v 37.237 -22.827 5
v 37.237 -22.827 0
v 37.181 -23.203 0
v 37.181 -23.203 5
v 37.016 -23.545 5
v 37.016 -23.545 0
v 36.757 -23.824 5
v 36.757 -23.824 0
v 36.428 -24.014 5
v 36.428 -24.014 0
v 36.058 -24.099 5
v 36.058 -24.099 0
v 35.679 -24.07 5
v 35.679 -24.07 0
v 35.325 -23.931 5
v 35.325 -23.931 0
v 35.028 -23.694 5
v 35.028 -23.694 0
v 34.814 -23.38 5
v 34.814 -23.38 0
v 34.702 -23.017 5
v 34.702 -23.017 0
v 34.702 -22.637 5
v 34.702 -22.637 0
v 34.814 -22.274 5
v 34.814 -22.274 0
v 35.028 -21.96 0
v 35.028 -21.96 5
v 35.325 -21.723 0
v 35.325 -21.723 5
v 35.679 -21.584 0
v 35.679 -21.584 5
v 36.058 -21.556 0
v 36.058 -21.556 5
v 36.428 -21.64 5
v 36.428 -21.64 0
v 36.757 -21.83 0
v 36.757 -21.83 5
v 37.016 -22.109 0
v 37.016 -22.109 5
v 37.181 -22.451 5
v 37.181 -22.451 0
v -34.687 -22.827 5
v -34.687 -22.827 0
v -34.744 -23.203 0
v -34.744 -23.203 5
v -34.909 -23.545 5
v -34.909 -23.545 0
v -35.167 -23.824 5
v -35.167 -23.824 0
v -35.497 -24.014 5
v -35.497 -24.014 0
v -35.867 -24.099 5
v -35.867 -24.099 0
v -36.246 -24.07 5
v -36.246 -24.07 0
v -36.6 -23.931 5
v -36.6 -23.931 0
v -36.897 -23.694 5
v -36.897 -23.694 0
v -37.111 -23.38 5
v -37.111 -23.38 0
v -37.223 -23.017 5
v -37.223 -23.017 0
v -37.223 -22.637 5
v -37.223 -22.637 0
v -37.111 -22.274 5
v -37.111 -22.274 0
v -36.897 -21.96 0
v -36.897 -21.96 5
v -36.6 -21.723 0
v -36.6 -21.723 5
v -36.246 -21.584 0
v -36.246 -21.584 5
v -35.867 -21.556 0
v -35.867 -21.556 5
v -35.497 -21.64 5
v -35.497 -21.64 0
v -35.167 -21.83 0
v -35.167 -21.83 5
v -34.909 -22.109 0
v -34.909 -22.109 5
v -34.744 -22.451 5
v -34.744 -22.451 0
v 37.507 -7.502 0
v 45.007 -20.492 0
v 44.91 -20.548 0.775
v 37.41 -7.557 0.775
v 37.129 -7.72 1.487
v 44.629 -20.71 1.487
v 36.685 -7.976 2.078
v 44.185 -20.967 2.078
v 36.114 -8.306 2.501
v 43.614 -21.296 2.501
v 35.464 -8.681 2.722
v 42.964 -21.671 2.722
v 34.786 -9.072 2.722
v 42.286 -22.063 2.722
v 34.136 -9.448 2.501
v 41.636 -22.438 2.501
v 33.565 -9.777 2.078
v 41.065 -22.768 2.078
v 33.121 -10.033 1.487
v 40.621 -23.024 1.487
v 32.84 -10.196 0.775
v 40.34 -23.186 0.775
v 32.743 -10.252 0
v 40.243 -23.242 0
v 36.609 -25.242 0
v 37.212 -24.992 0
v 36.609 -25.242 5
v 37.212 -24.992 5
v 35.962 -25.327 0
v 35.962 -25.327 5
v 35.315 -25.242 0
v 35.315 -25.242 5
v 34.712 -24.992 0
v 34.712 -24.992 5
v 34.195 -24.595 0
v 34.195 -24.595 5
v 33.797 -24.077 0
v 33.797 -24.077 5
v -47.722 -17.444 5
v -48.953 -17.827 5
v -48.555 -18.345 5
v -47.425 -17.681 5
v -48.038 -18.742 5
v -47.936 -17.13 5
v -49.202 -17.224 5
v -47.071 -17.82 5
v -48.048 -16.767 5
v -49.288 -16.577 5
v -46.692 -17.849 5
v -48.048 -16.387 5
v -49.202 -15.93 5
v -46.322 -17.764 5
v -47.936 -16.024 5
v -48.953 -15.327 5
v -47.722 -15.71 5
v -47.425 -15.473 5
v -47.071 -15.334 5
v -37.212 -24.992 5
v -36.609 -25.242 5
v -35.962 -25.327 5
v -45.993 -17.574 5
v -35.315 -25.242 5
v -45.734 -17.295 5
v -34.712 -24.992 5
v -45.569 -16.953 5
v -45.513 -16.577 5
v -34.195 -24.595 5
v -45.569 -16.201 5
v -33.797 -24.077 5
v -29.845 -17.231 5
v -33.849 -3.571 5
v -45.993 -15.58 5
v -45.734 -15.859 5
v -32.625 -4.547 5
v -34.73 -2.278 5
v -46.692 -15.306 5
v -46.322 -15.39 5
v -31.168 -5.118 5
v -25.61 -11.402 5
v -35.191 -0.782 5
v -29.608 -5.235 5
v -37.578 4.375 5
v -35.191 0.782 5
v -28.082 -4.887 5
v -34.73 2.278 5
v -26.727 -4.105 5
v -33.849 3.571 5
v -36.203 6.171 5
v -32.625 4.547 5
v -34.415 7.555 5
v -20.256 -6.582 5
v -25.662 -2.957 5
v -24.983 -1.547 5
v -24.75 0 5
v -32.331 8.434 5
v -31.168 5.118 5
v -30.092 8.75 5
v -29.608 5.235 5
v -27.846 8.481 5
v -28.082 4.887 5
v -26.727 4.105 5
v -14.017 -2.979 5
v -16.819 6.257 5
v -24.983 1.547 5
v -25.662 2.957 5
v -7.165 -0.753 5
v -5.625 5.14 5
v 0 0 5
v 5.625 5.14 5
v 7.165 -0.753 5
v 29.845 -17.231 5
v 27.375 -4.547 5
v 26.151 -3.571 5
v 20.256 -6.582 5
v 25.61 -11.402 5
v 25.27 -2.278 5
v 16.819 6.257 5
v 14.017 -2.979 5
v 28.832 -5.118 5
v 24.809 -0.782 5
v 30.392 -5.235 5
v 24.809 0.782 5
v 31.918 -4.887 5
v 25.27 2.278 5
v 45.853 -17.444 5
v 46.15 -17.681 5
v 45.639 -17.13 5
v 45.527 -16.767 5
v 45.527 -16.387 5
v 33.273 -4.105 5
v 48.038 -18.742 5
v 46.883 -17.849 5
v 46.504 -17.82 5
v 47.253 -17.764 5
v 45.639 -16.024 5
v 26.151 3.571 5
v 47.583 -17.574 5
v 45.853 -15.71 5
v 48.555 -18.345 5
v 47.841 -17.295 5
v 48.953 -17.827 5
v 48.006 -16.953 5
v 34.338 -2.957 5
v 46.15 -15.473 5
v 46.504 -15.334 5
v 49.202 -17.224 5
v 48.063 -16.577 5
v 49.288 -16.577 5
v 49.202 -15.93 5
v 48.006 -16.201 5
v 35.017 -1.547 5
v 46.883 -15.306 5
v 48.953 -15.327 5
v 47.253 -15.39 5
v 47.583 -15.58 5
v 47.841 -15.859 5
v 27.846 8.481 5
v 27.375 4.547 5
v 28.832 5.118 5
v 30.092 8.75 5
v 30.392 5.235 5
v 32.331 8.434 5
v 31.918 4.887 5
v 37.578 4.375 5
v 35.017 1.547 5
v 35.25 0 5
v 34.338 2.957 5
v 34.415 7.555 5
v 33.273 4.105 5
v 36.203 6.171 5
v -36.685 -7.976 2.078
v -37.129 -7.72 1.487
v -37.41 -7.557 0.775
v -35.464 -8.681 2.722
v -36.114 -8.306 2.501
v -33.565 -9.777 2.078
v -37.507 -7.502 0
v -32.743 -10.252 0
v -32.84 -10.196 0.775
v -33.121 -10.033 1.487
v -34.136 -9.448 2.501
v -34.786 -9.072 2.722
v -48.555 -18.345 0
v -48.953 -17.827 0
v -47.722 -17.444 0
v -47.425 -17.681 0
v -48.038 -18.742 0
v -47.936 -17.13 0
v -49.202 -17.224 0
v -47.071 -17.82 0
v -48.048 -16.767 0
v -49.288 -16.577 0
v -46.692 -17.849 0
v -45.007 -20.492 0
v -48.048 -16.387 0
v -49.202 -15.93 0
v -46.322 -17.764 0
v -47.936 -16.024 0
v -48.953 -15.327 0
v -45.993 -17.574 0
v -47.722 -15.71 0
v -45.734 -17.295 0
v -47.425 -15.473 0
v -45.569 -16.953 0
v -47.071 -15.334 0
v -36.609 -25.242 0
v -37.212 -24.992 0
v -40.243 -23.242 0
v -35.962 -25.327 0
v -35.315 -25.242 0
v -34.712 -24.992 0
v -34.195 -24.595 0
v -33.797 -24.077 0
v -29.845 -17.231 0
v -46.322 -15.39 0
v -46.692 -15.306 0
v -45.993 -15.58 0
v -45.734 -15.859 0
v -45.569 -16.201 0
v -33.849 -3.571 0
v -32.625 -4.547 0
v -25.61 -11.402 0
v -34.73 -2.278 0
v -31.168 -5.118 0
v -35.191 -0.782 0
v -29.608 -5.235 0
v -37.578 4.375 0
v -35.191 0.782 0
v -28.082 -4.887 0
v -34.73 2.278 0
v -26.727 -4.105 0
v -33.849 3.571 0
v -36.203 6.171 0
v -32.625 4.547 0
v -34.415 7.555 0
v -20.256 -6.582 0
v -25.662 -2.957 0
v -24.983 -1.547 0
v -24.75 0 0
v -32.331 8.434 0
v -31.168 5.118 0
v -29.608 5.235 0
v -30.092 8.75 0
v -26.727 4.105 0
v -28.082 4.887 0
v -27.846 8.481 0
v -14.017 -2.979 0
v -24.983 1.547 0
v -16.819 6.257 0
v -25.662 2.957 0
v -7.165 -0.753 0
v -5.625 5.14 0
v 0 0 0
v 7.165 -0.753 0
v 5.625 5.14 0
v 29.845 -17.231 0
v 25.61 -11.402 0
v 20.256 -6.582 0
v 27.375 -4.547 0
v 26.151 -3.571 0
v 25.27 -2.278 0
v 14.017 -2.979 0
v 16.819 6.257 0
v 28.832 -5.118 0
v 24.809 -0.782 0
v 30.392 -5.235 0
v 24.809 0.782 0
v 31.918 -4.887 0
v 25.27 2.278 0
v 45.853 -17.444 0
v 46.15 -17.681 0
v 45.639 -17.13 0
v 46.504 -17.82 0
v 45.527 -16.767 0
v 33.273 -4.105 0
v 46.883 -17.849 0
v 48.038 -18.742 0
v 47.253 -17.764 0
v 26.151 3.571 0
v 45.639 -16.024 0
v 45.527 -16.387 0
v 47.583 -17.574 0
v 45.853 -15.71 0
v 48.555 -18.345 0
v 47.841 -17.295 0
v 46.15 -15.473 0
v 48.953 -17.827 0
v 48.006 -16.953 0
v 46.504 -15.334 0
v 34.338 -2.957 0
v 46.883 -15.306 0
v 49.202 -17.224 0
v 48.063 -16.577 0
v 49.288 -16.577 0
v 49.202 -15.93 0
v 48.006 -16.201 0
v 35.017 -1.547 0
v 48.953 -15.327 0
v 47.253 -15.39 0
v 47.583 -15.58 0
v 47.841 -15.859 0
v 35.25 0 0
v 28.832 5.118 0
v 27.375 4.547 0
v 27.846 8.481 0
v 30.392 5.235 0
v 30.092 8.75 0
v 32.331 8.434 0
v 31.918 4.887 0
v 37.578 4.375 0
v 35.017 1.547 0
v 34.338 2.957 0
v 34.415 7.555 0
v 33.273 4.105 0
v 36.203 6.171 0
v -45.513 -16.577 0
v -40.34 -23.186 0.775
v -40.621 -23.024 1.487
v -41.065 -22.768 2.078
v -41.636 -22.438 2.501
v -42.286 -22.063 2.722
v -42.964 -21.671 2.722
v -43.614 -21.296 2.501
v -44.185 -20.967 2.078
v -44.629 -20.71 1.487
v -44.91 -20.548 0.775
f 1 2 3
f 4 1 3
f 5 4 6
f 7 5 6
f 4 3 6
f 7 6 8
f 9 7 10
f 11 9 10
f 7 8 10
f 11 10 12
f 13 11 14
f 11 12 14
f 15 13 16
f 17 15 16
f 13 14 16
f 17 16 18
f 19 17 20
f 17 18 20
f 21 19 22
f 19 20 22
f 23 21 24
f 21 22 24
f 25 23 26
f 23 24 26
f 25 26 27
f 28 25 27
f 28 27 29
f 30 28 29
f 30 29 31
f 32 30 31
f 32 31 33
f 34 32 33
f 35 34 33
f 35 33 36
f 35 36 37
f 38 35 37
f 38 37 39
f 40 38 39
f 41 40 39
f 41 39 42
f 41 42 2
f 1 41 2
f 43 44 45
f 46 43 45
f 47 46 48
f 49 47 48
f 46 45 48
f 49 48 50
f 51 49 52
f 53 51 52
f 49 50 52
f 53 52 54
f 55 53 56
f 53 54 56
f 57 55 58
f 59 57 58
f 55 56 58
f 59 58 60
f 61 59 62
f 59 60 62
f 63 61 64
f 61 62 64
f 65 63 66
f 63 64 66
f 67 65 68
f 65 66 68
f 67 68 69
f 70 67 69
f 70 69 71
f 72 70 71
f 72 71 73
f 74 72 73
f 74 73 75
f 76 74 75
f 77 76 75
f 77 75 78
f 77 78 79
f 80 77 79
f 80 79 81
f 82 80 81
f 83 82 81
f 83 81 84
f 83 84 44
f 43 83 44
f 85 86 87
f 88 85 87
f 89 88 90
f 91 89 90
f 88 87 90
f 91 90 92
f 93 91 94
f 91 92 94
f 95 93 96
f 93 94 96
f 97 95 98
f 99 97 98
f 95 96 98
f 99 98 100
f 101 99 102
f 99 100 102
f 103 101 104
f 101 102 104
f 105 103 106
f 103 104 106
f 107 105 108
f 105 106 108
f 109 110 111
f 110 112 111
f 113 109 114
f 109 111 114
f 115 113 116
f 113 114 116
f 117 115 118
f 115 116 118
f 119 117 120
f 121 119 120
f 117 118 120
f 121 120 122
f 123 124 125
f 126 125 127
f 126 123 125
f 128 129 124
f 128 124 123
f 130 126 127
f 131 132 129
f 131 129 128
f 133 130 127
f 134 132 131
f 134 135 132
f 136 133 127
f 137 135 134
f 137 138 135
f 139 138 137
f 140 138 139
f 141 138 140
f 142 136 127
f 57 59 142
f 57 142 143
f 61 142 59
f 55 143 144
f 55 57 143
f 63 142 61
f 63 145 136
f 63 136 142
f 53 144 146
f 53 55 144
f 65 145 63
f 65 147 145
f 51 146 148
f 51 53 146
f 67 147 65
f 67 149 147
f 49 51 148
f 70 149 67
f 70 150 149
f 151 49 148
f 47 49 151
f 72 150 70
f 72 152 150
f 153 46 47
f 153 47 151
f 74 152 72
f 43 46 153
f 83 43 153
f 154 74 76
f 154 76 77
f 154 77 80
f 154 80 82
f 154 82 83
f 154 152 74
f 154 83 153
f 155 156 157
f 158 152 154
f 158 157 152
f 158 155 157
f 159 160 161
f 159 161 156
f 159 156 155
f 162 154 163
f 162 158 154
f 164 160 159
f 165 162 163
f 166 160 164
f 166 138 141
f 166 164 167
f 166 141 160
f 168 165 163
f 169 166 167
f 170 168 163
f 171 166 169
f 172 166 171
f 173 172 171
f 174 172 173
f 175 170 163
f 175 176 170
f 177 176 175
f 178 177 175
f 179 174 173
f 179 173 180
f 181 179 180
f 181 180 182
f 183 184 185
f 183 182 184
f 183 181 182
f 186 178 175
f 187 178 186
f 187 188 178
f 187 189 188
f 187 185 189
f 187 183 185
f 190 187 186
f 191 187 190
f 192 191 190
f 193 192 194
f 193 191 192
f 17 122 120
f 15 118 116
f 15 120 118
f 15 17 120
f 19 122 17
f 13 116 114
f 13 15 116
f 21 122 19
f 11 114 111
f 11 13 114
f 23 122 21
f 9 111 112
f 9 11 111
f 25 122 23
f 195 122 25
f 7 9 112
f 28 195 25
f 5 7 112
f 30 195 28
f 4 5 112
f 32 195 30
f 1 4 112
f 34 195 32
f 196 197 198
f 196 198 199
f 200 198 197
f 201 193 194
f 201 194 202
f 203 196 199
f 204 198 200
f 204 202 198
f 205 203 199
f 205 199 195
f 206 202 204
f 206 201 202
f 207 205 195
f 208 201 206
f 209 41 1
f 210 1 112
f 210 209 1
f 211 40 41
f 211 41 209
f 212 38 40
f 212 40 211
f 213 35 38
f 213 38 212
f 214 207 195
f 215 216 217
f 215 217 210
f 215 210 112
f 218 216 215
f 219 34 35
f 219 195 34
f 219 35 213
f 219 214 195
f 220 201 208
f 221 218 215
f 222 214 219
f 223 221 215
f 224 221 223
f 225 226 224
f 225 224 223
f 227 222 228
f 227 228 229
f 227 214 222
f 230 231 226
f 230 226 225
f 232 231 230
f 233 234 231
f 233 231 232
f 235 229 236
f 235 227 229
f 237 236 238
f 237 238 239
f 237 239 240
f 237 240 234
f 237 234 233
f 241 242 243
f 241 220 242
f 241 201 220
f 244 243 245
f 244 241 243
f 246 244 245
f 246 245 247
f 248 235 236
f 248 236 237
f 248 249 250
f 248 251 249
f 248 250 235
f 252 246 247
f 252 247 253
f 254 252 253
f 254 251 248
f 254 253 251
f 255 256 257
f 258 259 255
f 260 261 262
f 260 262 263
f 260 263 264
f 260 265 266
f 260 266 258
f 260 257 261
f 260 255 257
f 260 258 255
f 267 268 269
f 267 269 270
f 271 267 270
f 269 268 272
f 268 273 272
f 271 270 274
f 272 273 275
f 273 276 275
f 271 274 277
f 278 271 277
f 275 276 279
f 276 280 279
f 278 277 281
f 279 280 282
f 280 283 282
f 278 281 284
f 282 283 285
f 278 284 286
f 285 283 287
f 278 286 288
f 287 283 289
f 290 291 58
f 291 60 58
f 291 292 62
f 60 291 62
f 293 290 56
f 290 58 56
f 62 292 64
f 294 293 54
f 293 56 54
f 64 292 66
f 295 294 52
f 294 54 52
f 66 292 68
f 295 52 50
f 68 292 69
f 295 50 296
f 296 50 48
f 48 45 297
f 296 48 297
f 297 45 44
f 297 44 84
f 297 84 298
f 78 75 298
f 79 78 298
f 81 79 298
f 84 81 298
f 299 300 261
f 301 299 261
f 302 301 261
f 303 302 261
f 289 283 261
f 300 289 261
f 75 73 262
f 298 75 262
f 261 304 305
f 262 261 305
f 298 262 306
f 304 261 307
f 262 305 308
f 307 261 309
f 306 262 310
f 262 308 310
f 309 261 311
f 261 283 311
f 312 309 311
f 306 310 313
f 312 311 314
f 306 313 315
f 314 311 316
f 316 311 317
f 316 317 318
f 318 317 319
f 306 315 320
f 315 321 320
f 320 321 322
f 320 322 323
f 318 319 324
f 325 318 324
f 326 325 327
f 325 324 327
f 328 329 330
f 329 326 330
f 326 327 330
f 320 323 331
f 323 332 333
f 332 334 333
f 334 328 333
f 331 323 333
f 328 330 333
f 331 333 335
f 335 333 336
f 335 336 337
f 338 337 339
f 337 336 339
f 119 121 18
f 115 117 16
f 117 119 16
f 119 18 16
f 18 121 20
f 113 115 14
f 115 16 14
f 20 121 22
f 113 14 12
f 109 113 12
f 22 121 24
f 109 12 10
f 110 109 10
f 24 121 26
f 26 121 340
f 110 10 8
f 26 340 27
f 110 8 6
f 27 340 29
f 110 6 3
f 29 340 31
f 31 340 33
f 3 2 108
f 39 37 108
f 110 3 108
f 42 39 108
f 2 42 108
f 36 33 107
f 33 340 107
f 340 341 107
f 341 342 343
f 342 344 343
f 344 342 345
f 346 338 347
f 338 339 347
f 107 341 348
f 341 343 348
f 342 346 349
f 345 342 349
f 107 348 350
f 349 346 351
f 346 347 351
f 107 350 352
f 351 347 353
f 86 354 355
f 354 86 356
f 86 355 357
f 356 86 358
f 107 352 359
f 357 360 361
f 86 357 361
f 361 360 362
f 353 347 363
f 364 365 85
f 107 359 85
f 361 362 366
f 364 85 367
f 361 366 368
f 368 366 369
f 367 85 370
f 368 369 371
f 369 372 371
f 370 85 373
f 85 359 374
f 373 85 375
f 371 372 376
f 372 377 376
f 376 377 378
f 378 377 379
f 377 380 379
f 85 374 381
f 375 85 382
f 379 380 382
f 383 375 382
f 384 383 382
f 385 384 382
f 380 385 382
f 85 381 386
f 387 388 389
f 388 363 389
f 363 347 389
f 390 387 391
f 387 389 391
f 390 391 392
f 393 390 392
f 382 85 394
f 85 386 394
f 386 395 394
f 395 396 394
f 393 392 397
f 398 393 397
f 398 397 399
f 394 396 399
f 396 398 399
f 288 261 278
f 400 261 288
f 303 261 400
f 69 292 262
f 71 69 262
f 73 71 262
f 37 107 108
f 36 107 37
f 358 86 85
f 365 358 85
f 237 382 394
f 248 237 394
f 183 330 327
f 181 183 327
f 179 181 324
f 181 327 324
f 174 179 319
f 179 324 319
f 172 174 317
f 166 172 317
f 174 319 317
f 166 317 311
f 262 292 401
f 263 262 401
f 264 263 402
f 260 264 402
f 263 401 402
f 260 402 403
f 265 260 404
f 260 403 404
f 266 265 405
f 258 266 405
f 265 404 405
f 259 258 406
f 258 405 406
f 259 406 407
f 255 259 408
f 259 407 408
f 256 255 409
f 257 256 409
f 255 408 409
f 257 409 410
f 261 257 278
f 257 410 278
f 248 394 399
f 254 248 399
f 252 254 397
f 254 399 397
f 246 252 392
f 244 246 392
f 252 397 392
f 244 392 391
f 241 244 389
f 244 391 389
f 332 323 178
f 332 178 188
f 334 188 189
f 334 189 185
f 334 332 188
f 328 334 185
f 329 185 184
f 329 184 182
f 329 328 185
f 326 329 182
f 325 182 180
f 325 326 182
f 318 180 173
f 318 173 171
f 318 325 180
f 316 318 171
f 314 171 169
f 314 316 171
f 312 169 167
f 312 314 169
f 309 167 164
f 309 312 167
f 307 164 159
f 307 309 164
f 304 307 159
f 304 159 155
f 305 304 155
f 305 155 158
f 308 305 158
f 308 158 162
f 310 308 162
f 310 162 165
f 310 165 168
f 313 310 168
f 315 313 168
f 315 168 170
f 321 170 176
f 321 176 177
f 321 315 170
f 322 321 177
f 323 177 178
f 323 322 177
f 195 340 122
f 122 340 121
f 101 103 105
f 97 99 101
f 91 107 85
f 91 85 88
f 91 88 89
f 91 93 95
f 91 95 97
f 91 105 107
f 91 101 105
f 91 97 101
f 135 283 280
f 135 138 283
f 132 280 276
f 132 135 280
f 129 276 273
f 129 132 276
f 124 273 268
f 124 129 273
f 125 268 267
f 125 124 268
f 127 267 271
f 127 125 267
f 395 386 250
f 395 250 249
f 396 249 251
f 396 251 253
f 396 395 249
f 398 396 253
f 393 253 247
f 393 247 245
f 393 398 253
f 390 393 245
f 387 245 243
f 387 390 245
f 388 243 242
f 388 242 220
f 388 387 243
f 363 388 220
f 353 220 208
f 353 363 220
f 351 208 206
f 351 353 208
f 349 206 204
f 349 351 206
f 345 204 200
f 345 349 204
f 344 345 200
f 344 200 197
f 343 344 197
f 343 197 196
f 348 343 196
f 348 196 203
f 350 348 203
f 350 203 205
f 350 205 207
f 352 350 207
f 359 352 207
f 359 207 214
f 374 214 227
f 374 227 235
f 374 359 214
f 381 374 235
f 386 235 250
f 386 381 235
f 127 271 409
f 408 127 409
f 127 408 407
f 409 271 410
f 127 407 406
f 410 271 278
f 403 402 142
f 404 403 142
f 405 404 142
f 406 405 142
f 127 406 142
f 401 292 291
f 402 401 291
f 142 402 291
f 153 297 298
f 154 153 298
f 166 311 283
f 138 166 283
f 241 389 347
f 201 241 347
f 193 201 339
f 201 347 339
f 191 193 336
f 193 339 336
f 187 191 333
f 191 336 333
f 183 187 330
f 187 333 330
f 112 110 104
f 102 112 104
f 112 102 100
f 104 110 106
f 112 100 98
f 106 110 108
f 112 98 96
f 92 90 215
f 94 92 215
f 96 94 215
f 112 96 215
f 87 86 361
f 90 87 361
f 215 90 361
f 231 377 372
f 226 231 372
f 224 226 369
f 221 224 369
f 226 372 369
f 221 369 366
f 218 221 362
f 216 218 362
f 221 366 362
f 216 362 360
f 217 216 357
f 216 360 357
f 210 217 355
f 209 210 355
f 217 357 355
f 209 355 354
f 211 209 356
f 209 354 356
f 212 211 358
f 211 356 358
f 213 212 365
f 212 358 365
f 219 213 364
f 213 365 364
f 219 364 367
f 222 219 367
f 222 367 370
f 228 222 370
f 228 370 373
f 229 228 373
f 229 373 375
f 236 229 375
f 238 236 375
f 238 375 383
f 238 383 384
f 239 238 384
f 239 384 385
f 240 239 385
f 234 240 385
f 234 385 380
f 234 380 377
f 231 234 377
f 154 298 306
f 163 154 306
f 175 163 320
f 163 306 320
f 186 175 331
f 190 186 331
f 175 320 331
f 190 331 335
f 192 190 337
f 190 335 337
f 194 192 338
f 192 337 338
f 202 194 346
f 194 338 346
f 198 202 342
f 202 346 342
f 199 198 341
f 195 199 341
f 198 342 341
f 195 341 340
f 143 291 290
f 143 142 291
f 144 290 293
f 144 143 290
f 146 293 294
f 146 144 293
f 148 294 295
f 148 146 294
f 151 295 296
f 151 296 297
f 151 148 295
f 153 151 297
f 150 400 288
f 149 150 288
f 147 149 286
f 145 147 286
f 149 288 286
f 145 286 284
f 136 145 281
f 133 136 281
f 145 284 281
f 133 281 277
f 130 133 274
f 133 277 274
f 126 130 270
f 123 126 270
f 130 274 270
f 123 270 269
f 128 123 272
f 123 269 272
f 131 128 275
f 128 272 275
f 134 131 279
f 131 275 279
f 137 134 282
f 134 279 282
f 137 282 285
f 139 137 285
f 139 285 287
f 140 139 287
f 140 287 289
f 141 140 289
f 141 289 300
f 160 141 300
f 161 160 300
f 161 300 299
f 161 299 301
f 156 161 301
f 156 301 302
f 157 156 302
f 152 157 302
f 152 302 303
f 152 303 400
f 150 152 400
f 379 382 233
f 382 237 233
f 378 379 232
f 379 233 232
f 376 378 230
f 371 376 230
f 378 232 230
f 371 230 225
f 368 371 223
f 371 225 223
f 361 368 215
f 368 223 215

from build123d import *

# Parameters (mm, degrees)
F0_R     = 5.25
F1_DEPTH = 5
F2_R     = 2.75
F3_DEPTH = 15
F4_R     = 2.75
F5_DEPTH = 15
F6_R     = 1.275
F7_DEPTH = 5.001
F8_R     = 2.5


with BuildPart() as f1:
    # F0 (on Top) → F1 (new body)
    with BuildSketch(Plane.XY):
        with BuildLine():
            ThreePointArc((27.8461538462, 8.4807692308), (0, 5), (-27.8461538462, 8.4807692308))
            ThreePointArc((-27.8461538462, 8.4807692308), (-33.4013149384, 8.0618581412), (-37.5777222831, 4.375))
            Line((-37.5777222831, 4.375), (-50.2027222831, -17.4921414456))
            Line((-50.2027222831, -17.4921414456), (-35.0472777169, -26.2421414456))
            Line((-35.0472777169, -26.2421414456), (-29.8445554338, -17.2307621135))
            ThreePointArc((-29.8445554338, -17.2307621135), (0, 0), (29.8445554338, -17.2307621135))
            Line((29.8445554338, -17.2307621135), (35.0472777169, -26.2421414456))
            Line((35.0472777169, -26.2421414456), (50.2027222831, -17.4921414456))
            Line((50.2027222831, -17.4921414456), (37.5777222831, 4.375))
            ThreePointArc((37.5777222831, 4.375), (33.4013149384, 8.0618581412), (27.8461538462, 8.4807692308))
        make_face()
        with Locations((-30, 0)):
            Circle(F0_R, mode=Mode.SUBTRACT)
        with Locations((30, 0)):
            Circle(F0_R, mode=Mode.SUBTRACT)
    extrude(amount=F1_DEPTH)

    # F2 (on face) → F3 (cut)
    with BuildSketch(Plane(origin=(-20.125, -34.8575225023, 0), x_dir=(0.8660254038, -0.5, 0), z_dir=(-0.5, -0.8660254038, 0))):
        with Locations((-25.9807621135, 0)):
            Circle(F2_R)
    extrude(amount=-F3_DEPTH, mode=Mode.SUBTRACT)

    # F4 (on face) → F5 (cut)
    with BuildSketch(Plane(origin=(20.125, -34.8575225023, 0), x_dir=(0.8660254038, 0.5, 0), z_dir=(0.5, -0.8660254038, 0))):
        with Locations((25.9807621135, 0)):
            Circle(F4_R)
    extrude(amount=-F5_DEPTH, mode=Mode.SUBTRACT)

    # F6 (on face) → F7 (cut, through all)
    with BuildSketch(Plane(origin=(0, 0, 0), x_dir=(1, 0, 0), z_dir=(0, 0, -1))):
        with Locations((-46.7876587737, 16.5770779361)):
            Circle(F6_R)
        with Locations((-35.9623412263, 22.8270779361)):
            Circle(F6_R)
        with Locations((35.9623412263, 22.8270779361)):
            Circle(F6_R)
        with Locations((46.7876587737, 16.5770779361)):
            Circle(F6_R)
    extrude(amount=-F7_DEPTH, mode=Mode.SUBTRACT)

    # F8
    f8_edges = [f1.edges().sort_by_distance(p)[0] for p in [
        (-50.202722, -17.492141, 2.5),
        (-35.047278, -26.242141, 2.5),
        (35.047278, -26.242141, 2.5),
        (50.202722, -17.492141, 2.5),
    ]]
    fillet(f8_edges, radius=F8_R)


solid = f1.part
